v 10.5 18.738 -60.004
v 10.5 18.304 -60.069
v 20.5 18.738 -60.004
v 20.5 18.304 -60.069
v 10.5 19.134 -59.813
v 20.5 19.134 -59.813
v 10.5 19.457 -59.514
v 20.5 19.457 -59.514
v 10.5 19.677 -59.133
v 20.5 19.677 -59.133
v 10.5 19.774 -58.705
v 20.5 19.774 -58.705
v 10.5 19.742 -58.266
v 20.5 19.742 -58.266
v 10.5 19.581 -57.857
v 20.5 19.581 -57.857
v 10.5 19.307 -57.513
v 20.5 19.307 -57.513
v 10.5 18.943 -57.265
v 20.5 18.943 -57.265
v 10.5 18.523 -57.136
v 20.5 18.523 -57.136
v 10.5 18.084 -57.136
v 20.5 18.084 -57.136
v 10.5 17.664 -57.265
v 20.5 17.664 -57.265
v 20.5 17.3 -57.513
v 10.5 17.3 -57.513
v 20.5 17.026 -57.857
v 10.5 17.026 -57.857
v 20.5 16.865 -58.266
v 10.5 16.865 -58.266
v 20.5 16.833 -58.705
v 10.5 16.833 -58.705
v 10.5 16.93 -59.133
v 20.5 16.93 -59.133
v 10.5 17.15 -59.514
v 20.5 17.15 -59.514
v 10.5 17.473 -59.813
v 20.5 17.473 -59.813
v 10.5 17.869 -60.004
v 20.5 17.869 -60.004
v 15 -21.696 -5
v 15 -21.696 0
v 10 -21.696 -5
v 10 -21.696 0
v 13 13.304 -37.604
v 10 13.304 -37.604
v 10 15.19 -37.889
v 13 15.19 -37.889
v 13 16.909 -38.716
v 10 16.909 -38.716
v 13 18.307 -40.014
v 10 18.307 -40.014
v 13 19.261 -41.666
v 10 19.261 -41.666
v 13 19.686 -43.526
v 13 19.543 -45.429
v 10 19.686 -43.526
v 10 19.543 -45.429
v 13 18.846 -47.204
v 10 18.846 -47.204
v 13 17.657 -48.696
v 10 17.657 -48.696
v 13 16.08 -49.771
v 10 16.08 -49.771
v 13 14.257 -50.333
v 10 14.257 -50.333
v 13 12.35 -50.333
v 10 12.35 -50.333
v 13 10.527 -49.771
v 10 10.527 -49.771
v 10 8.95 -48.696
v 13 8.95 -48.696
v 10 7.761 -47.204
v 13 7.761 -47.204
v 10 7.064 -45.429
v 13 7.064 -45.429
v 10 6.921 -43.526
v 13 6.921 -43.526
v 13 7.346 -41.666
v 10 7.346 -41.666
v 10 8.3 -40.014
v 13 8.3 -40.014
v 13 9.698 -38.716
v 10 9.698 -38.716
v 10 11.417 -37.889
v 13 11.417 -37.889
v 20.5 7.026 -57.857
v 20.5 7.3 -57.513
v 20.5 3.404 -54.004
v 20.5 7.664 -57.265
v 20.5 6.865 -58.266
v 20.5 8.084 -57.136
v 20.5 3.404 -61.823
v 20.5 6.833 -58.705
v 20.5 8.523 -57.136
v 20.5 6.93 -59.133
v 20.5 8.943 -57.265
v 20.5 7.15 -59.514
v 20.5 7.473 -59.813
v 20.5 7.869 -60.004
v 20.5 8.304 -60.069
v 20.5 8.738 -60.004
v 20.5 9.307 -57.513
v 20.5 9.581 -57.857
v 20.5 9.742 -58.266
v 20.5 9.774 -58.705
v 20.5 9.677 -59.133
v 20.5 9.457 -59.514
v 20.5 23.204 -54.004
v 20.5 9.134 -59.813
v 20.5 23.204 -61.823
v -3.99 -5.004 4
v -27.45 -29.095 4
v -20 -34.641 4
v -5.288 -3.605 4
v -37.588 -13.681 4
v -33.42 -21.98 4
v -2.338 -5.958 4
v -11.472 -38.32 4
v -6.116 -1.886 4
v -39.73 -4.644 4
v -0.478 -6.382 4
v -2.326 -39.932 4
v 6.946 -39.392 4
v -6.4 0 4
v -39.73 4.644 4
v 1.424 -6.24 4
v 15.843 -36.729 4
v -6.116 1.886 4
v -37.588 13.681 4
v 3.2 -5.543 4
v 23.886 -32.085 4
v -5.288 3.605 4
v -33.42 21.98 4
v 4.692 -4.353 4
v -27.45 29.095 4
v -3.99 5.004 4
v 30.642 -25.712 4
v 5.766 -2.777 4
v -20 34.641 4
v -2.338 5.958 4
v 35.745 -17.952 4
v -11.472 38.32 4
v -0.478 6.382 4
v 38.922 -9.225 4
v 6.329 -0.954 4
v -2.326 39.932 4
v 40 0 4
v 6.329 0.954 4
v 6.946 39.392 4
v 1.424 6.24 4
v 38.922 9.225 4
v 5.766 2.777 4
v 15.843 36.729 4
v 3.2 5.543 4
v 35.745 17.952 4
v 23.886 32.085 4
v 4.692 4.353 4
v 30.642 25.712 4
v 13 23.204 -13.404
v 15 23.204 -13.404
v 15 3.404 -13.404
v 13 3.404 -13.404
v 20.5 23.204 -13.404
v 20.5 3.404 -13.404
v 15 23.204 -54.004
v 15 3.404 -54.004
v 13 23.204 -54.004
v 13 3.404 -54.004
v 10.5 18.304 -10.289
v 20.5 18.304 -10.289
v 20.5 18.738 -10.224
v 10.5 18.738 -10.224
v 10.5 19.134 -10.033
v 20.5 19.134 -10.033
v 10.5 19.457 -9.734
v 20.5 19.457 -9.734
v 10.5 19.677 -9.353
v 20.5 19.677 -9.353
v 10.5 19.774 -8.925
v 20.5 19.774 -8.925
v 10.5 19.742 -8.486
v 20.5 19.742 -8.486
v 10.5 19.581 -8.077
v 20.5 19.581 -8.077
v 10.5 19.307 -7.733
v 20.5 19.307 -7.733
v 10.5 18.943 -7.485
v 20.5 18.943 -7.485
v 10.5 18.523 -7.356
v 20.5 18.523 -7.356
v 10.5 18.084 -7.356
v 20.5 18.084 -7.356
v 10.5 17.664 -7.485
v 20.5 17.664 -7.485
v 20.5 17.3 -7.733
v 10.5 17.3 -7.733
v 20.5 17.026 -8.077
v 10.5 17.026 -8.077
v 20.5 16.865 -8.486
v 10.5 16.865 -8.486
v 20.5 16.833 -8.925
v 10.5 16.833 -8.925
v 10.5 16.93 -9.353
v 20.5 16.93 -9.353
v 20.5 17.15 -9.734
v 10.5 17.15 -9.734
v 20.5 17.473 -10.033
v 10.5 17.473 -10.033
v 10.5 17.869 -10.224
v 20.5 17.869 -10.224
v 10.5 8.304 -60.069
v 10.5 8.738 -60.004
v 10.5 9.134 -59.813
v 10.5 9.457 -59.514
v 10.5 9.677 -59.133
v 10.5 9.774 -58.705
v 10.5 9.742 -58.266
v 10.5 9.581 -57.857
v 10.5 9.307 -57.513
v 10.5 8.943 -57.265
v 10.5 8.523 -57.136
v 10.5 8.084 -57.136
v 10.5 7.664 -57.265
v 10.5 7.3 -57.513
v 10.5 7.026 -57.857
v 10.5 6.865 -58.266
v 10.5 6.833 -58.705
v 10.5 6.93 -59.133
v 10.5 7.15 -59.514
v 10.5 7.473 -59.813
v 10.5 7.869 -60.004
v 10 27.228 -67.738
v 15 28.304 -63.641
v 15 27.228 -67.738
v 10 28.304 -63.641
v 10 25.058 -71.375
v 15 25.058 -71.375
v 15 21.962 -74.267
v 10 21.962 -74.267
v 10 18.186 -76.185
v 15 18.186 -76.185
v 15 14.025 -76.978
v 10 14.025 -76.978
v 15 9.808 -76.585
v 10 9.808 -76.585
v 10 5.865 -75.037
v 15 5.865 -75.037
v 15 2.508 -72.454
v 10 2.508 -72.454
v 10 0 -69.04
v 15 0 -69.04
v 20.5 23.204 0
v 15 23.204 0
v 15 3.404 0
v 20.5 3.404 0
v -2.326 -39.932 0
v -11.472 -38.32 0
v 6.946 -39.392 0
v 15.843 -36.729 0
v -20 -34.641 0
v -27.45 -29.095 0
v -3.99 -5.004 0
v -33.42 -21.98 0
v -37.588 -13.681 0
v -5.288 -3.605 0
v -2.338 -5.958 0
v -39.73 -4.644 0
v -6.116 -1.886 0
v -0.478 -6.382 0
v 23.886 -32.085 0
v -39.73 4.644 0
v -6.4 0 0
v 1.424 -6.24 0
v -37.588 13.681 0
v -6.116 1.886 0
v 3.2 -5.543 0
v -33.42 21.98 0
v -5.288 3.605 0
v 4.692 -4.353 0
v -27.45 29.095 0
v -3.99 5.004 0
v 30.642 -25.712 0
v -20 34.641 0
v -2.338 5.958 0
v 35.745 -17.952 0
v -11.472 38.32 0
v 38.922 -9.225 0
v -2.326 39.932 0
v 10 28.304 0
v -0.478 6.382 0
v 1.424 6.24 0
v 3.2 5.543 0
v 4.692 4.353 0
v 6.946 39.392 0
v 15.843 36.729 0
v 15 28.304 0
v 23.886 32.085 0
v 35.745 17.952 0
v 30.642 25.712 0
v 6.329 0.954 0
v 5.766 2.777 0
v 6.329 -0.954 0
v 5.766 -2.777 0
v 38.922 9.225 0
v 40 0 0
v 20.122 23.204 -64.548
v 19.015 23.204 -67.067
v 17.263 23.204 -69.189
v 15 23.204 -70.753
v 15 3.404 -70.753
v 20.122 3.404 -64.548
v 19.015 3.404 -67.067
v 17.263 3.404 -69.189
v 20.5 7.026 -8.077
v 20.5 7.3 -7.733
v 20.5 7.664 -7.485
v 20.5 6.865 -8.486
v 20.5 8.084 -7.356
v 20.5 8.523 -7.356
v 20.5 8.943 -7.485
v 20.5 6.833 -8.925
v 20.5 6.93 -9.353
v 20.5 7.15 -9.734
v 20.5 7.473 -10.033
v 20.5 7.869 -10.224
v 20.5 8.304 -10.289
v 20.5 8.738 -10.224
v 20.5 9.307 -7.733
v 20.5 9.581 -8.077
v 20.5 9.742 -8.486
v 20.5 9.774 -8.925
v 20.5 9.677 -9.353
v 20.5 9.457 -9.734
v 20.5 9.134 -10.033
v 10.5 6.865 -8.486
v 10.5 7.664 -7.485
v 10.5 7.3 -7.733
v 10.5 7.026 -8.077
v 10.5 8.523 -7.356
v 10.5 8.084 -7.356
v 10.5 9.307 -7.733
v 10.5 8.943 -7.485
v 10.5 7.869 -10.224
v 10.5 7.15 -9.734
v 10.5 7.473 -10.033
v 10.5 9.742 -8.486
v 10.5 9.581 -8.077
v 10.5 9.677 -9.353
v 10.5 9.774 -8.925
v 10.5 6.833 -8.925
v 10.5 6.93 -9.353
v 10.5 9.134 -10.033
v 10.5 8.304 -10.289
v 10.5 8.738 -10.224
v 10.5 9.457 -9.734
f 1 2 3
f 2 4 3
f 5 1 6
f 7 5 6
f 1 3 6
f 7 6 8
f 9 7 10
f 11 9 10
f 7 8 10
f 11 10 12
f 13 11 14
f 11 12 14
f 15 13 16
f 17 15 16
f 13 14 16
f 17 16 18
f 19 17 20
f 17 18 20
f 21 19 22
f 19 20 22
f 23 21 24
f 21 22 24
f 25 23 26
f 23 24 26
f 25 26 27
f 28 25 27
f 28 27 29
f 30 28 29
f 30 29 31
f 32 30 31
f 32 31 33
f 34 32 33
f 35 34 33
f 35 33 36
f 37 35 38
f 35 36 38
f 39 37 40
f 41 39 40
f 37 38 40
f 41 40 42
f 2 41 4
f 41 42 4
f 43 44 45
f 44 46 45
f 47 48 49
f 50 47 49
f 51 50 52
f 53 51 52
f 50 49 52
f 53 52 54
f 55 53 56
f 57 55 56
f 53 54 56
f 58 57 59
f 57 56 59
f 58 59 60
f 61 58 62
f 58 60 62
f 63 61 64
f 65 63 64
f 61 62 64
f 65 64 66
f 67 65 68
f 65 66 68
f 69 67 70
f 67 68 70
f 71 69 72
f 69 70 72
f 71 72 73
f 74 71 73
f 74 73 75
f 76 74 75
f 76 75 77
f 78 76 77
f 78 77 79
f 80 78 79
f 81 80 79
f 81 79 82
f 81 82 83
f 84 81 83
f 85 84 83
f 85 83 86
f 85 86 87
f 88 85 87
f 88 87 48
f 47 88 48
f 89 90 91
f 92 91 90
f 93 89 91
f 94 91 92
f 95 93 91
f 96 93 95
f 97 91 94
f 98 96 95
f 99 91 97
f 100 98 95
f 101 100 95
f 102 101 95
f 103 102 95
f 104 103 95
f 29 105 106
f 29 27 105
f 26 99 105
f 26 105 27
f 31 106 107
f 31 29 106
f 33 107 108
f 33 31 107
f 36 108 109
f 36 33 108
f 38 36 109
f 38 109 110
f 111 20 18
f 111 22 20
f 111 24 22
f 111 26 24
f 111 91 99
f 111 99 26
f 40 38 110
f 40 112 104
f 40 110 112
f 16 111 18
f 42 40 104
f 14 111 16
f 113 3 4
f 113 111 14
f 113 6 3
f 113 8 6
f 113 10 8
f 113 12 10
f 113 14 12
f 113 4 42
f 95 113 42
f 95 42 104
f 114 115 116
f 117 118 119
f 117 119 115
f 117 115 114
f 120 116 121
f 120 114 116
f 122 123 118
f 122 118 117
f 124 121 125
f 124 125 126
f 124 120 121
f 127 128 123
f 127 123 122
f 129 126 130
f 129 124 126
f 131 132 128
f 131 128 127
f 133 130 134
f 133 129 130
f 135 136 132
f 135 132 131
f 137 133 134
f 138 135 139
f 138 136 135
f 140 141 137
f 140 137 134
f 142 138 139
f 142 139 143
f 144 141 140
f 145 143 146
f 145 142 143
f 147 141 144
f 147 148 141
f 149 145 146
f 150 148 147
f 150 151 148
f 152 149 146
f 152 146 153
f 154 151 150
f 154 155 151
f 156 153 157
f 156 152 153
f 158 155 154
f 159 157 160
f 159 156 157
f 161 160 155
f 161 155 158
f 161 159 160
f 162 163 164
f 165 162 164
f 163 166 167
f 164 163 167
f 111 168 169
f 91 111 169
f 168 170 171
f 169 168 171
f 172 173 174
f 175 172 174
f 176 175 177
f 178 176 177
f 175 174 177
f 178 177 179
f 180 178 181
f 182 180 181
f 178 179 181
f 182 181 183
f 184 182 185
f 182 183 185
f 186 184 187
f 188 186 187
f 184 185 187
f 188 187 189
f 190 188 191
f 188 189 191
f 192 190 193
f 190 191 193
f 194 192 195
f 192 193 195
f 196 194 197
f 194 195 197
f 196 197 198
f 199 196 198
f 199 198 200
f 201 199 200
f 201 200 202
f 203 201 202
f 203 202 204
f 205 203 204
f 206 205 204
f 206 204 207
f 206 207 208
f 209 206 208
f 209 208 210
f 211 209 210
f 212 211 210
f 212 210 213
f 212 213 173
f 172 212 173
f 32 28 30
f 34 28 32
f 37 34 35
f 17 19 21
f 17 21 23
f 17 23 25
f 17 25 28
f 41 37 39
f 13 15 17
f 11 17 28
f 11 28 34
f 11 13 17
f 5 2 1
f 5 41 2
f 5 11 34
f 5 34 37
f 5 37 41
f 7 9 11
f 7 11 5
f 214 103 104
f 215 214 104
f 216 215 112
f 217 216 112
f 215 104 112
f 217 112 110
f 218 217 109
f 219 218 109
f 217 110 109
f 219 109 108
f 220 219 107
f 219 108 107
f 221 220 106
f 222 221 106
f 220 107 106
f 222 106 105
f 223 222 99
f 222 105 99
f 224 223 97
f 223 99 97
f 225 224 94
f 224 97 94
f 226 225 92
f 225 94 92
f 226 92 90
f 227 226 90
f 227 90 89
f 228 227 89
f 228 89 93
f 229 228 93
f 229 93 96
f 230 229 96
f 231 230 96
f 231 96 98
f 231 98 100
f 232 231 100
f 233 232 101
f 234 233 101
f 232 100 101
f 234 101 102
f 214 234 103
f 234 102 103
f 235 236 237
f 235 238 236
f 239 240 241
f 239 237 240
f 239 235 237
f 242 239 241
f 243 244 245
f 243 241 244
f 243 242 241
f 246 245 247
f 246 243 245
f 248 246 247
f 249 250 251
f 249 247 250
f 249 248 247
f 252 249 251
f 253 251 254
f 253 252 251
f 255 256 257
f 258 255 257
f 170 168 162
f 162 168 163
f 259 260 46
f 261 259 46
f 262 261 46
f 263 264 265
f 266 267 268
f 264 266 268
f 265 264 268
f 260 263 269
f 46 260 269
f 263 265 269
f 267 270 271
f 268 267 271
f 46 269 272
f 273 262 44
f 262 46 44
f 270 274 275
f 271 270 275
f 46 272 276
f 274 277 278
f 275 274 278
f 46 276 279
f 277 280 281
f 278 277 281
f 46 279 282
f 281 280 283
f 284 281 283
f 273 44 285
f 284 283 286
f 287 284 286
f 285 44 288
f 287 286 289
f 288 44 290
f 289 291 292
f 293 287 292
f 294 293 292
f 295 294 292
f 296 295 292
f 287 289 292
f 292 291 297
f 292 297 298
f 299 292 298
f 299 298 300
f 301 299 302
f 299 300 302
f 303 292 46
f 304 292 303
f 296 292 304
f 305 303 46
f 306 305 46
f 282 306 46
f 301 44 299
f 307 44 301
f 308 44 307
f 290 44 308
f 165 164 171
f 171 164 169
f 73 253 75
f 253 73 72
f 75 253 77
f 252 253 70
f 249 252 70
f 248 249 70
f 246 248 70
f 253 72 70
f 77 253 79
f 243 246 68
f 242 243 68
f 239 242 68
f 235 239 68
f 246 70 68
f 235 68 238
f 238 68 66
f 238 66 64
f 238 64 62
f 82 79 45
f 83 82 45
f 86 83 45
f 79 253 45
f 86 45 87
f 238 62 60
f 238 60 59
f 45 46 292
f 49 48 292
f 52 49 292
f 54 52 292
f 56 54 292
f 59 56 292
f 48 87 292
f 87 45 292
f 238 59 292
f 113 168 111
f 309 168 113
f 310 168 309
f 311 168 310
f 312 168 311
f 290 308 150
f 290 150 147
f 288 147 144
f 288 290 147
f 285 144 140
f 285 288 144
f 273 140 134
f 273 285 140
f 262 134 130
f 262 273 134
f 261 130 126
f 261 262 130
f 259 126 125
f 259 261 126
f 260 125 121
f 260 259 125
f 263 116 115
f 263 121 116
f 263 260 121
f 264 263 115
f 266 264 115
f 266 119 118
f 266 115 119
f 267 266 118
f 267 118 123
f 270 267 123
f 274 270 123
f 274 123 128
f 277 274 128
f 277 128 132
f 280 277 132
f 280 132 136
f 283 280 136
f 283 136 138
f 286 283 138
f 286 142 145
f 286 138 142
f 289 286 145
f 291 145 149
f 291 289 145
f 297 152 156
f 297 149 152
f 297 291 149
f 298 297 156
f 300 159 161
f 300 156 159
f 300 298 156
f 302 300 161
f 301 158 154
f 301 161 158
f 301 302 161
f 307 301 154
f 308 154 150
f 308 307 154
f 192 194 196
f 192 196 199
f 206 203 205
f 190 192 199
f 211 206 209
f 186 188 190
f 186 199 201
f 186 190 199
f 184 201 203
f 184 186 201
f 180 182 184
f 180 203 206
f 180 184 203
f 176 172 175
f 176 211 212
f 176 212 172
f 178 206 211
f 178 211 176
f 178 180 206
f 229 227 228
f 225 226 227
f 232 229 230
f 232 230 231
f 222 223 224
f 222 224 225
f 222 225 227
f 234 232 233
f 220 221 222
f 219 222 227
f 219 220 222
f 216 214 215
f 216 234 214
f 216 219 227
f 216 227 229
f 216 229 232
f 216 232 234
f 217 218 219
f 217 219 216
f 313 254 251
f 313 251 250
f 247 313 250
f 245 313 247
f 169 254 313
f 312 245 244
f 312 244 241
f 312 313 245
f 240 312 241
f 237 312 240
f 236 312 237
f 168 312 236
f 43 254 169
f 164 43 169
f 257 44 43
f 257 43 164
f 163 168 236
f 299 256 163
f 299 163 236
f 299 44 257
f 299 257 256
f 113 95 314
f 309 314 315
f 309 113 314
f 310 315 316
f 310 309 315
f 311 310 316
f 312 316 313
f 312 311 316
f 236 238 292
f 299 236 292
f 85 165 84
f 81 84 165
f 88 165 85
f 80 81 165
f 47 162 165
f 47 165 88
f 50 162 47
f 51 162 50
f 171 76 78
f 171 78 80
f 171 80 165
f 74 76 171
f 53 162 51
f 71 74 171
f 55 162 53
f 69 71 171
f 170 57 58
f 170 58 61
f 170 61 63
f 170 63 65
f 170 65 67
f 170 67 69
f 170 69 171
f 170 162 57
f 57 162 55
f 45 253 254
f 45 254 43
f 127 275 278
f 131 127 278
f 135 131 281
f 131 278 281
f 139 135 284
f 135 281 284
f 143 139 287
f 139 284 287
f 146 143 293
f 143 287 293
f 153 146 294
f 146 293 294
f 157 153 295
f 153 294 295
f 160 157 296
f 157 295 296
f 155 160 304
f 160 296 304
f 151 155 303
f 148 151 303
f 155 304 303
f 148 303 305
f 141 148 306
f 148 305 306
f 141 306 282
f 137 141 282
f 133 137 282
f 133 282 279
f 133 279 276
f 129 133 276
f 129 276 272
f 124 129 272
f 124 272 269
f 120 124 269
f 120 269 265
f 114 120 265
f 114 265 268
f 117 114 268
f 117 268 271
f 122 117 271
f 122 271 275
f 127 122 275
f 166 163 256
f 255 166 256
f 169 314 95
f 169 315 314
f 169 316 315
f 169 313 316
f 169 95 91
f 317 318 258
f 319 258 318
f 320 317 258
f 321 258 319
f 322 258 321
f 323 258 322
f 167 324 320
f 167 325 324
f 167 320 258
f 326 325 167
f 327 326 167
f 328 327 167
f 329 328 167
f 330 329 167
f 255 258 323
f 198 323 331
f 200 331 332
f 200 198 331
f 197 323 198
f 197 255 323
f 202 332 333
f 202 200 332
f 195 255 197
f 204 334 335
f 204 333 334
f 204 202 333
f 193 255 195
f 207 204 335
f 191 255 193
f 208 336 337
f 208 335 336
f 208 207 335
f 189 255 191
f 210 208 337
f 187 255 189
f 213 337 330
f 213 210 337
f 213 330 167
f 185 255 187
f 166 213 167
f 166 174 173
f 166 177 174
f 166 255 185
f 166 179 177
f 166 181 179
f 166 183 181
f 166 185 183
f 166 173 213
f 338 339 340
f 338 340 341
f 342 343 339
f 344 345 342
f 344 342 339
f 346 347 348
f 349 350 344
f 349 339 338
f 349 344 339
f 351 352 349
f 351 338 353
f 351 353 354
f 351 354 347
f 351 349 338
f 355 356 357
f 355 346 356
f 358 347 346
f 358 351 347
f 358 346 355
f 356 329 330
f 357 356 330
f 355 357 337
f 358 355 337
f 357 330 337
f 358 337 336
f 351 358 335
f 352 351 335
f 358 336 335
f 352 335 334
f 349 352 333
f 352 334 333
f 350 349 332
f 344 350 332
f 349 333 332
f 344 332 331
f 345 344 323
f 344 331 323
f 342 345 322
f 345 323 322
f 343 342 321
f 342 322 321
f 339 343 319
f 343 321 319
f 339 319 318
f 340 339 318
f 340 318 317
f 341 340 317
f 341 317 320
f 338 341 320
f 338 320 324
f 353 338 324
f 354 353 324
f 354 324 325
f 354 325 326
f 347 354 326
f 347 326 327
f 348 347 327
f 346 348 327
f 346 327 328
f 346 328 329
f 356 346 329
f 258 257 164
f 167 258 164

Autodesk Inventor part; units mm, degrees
ref_plane "XZ Plane" through (0, 0, 0) normal (0, 1, 0) x (-1, 0, 0)
ref_plane "XY Plane" through (0, 0, 0) normal (0, 0, 1) x (1, 0, 0)
sketch "Sketch1" plane through (0, 0, 0) normal (0, 0, 1) x (1, 0, 0)
  circle A0 centre (0, 0) radius 40
  dimension "d0" = 80
extrude "Extrusion1" add sketch "Sketch1" along normal blind 4
ref_plane "Work Plane2" through (10, 0, 0) normal (1, 0, 0) x (0, 1, 0)
ref_plane "Work Plane1" through (-40, 0, 0) normal (1, 0, 0) x (0, 1, 0)
sketch "Sketch2" plane through (10, 0, 0) normal (1, 0, 0) x (0, 1, 0)
  line L0 (-21.6965, 0) -> (-21.6965, -5)
  line L1 (-21.6965, -5) -> (28.3035, -5)
  line L2 (28.3035, -5) -> (28.3035, 0)
  circle A0 centre (13.3035, -44.0044) radius 10
  line L3 (-21.6965, -5) -> (0, -41.2491)
  line L4 (28.3035, -5) -> (23.2249, -45.256)
  line L5 (-21.6965, 0) -> (28.3035, 0)
  line L6 (28.3035, -5) -> (28.3035, -63.6411)
  arc A1 (0, -69.0405) -> (28.3035, -60.1475) centre (13.3035, -61.8943) ccw
  arc A2 (4.8652, -49.3705) -> (4.8622, -49.3725) centre (13.3035, -61.8943) ccw
  line L7 (0, -69.0405) -> (-21.6965, -5)
  point P0 (0, 0)
  point P1 (11.1199, -34.2457)
  point P2 (4.723, -49.1401)
  dimension "d4" = 5
  dimension "d5" = 50
  dimension "d6" = 20
  dimension "d8" = 15
extrude "Extrusion4" add sketch "Sketch2" along normal blind 5 contours L5 L2 L1 L0 | L1 L6 A1 L7 | A0
sketch "Sketch3" plane through (10, 0, 0) normal (-1, 0, 0) x (0, 0, 1)
  arc A0 (-45.256, 23.2249) -> (-49.1401, 4.723) centre (-44.0044, 13.3035) ccw projected
  circle A1 centre (-44.0044, 13.3035) radius 6.4
  point P0 (0, 0)
  dimension "d15" = 12.8
extrude "Extrusion5" cut sketch "Sketch3" against normal through all
sketch "Sketch6" plane through (15, 0, 0) normal (1, 0, 0) x (0, 0, -1)
  point P0 (0, 0)
sketch "Sketch7" plane through (15, 0, 0) normal (1, 0, 0) x (0, 0, -1)
  line L0 (13.4044, 3.4035) -> (54.0044, 3.4035)
  line L1 (54.0044, 3.4035) -> (54.0044, 23.2035)
  line L2 (54.0044, 23.2035) -> (13.4044, 23.2035)
  line L3 (13.4044, 23.2035) -> (13.4044, 3.4035)
  line L4 (13.4044, 3.4035) -> (54.0044, 23.2035) construction
  line L5 (54.0044, 3.4035) -> (13.4044, 23.2035) construction
  circle A0 centre (44.0044, 13.3035) radius 6.4 projected
  point P0 (0, 0)
  point P1 (33.7044, 13.3035)
  dimension "d24" = 40.6
  dimension "d25" = 19.8
  dimension "d35" = 9.9
  dimension "d36" = 10
extrude "Extrusion8" cut sketch "Sketch7" against normal blind 2 contours L3 L2 L1 L0 | A0
sketch "Sketch8" plane through (15, 0, 0) normal (1, 0, 0) x (0, 0, -1)
  line L0 (54.0044, 23.2035) -> (54.0044, 3.4035) projected
  line L1 (54.0044, 23.2035) -> (64.0044, 23.2035)
  line L2 (64.0044, 23.2035) -> (64.0044, 3.4035)
  line L3 (64.0044, 3.4035) -> (54.0044, 3.4035)
  line L4 (54.0044, 3.4035) -> (54.0044, 23.2035)
  point P0 (0, 0)
  dimension "d28" = 10
  dimension "d29" = 19.8
extrude "Extrusion9" add sketch "Sketch8" along normal blind 5.5
sketch "Sketch9" plane through (15, 0, 0) normal (1, 0, 0) x (0, 0, -1)
  line L0 (64.0044, 23.2035) -> (64.0044, 3.4035) projected
  line L1 (64.0044, 23.2035) -> (70.7533, 23.2035)
  line L2 (70.7533, 23.2035) -> (70.7533, 3.4035)
  line L3 (70.7533, 3.4035) -> (64.0044, 3.4035)
  line L4 (64.0044, 3.4035) -> (64.0044, 23.2035)
  point P0 (0, 0)
extrude "Extrusion10" add sketch "Sketch9" along normal blind 5.5
fillet "Fillet1" radius 10 1 edges at (20.5, 13.3035, -70.7533)
sketch "Sketch10" plane through (15, 0, 0) normal (1, 0, 0) x (0, 0, -1)
  line L0 (13.4044, 3.4035) -> (13.4044, 23.2035)
  line L1 (13.4044, 3.4035) -> (13.4044, 23.2035) projected
  line L2 (13.4044, 23.2035) -> (0.0004, 23.2035)
  line L3 (0.0004, 23.2035) -> (0.0004, 3.4035)
  line L4 (0.0004, 3.4035) -> (13.4044, 3.4035)
  line L5 (13.4044, 3.4035) -> (13.4044, 23.2035)
  point P0 (0, 0)
  dimension "d38" = 13.404
extrude "Extrusion11" add sketch "Sketch10" along normal blind 5.5
sketch "Sketch11" plane through (20.5, 0, 0) normal (1, 0, 0) x (0, 0, -1)
  line L0 (0.0004, 23.2035) -> (13.4044, 23.2035) projected
  line L1 (13.4044, 23.2035) -> (8.8144, 23.2035)
  line L2 (13.4044, 18.3035) -> (13.4044, 23.2035)
  circle A0 centre (8.8144, 18.3035) radius 1.475
  line L3 (13.4044, 3.4035) -> (13.4044, 23.2035) projected
  line L4 (13.4044, 13.3035) -> (0.0004, 13.3035)
  line L5 (0.0004, 3.4035) -> (0.0004, 23.2035) projected
  circle A1 centre (8.8144, 8.3035) radius 1.475
  point P0 (0, 0)
  dimension "d43" = 2.95
  dimension "d44" = 2.95
extrude "Extrusion12" cut sketch "Sketch11" against normal blind 10 contours A0 | A1
sketch "Sketch12" plane through (20.5, 0, 0) normal (1, 0, 0) x (0, 0, -1)
  point P0 (0, 0)
sketch "Sketch13" plane through (10.5, 18.3035, -8.8144) normal (1, 0, 0) x (0, 0, -1)
  point P0 (-8.8144, -18.3035)
sketch "Sketch14" plane through (13, 0, 0) normal (1, 0, 0) x (0, 0, -1)
  circle A0 centre (8.8144, 18.3035) radius 1.475 projected
  line L0 (61.7531, 18.3035) -> (54.0044, 18.3035)
  line L1 (54.0044, 23.2035) -> (54.0044, 3.4035) projected
  point P0 (0, 0)
sketch "Sketch15" plane through (20.5, 0, 0) normal (1, 0, 0) x (0, 0, -1)
  circle A0 centre (8.8144, 18.3035) radius 1.475 projected
  line L0 (61.823, 23.2035) -> (61.823, 3.4035) projected
  circle A1 centre (8.8144, 8.3035) radius 1.475 projected
  line L1 (54.0044, 23.2035) -> (54.0044, 3.4035) projected
  circle A2 centre (58.5944, 18.3035) radius 1.475
  circle A3 centre (58.5944, 8.3035) radius 1.475
  point P0 (0, 0)
  dimension "d49" = 2.95
  dimension "d50" = 2.95
extrude "Extrusion13" cut sketch "Sketch15" against normal blind 10 contours A2 | A3
thread "Thread1" size "M3x0.5" class "6H" standard "ANSI Metric M Profile" full length
thread "Thread2" size "M3x0.5" class "6H" standard "ANSI Metric M Profile" full length
thread "Thread3" size "M3x0.5" class "6H" standard "ANSI Metric M Profile" full length
thread "Thread4" size "M3x0.5" class "6H" standard "ANSI Metric M Profile" full length
sketch "Sketch16" plane through (13, 0, 0) normal (1, 0, 0) x (0, 0, -1)
  point P0 (0, 0)
sketch "Sketch17" plane through (13, 0, 0) normal (1, 0, 0) x (0, 0, -1)
  point P0 (0, 0)
sketch "Sketch18" plane through (20.5, 0, 0) normal (1, 0, 0) x (0, 0, -1)
  point P0 (0, 0)
sketch "Sketch19" plane through (13, 0, 0) normal (1, 0, 0) x (0, 0, -1)
  point P0 (0, 0)
sketch "Sketch20" plane through (13, 0, 0) normal (1, 0, 0) x (0, 0, -1)
  point P0 (0, 0)
sketch "Sketch21" plane through (0, 0, 0) normal (0, 0, -1) x (-1, 0, 0)
  circle A0 centre (0, 0) radius 6.4
  dimension "d61" = 12.8
extrude "Extrusion14" cut sketch "Sketch21" against normal blind 10
sketch "Sketch22" plane through (13, 0, 0) normal (1, 0, 0) x (0, 0, -1)
  point P0 (0, 0)
sketch "Sketch23" plane through (0, 0, 0) normal (0, 0, -1) x (-1, 0, 0)
  point P0 (0, 0)
sketch "Sketch24" plane through (0, 0, 0) normal (0, 0, -1) x (-1, 0, 0)
  point P0 (0, 0)
sketch "Sketch25" plane through (0, 0, 0) normal (0, 0, -1) x (-1, 0, 0)
  point P0 (0, 0)
properties part number "wrist" material "Aluminum 6061"
